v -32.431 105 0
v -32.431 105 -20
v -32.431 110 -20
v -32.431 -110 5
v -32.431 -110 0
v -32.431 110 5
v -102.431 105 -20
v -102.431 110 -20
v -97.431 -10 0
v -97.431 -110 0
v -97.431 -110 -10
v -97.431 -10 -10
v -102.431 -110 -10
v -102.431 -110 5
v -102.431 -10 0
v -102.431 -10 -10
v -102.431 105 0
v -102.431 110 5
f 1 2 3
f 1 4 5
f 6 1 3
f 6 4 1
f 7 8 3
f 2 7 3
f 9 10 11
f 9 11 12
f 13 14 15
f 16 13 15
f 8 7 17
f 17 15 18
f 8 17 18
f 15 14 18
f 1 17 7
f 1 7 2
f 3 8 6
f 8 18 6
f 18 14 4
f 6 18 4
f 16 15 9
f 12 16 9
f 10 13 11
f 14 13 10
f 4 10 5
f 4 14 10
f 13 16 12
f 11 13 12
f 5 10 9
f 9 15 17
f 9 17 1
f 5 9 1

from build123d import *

# Parameters (mm, degrees)
SKETCH3_W           = 70
SKETCH3_H           = 220
BOSS_EXTRUDE2_DEPTH = 5
SKETCH4_W           = 5
SKETCH4_H           = 100
BOSS_EXTRUDE3_DEPTH = 10
SKETCH5_W           = 70
SKETCH5_H           = 5
BOSS_EXTRUDE4_DEPTH = 20


with BuildPart() as part:
    # Sketch3 → Boss-Extrude2 (new body)
    with BuildSketch(Plane.XY):
        with Locations((-67.431106164, 0)):
            Rectangle(SKETCH3_W, SKETCH3_H)
    extrude(amount=BOSS_EXTRUDE2_DEPTH)

    # Sketch4 → Boss-Extrude3 (add)
    with BuildSketch(Plane.XY):
        with Locations((-99.931106164, -60)):
            Rectangle(SKETCH4_W, SKETCH4_H)
    extrude(amount=-BOSS_EXTRUDE3_DEPTH)

    # Sketch5 → Boss-Extrude4 (add)
    with BuildSketch(Plane.XY):
        with Locations((-67.431106164, 107.5)):
            Rectangle(SKETCH5_W, SKETCH5_H)
    extrude(amount=-BOSS_EXTRUDE4_DEPTH)


solid = part.part
